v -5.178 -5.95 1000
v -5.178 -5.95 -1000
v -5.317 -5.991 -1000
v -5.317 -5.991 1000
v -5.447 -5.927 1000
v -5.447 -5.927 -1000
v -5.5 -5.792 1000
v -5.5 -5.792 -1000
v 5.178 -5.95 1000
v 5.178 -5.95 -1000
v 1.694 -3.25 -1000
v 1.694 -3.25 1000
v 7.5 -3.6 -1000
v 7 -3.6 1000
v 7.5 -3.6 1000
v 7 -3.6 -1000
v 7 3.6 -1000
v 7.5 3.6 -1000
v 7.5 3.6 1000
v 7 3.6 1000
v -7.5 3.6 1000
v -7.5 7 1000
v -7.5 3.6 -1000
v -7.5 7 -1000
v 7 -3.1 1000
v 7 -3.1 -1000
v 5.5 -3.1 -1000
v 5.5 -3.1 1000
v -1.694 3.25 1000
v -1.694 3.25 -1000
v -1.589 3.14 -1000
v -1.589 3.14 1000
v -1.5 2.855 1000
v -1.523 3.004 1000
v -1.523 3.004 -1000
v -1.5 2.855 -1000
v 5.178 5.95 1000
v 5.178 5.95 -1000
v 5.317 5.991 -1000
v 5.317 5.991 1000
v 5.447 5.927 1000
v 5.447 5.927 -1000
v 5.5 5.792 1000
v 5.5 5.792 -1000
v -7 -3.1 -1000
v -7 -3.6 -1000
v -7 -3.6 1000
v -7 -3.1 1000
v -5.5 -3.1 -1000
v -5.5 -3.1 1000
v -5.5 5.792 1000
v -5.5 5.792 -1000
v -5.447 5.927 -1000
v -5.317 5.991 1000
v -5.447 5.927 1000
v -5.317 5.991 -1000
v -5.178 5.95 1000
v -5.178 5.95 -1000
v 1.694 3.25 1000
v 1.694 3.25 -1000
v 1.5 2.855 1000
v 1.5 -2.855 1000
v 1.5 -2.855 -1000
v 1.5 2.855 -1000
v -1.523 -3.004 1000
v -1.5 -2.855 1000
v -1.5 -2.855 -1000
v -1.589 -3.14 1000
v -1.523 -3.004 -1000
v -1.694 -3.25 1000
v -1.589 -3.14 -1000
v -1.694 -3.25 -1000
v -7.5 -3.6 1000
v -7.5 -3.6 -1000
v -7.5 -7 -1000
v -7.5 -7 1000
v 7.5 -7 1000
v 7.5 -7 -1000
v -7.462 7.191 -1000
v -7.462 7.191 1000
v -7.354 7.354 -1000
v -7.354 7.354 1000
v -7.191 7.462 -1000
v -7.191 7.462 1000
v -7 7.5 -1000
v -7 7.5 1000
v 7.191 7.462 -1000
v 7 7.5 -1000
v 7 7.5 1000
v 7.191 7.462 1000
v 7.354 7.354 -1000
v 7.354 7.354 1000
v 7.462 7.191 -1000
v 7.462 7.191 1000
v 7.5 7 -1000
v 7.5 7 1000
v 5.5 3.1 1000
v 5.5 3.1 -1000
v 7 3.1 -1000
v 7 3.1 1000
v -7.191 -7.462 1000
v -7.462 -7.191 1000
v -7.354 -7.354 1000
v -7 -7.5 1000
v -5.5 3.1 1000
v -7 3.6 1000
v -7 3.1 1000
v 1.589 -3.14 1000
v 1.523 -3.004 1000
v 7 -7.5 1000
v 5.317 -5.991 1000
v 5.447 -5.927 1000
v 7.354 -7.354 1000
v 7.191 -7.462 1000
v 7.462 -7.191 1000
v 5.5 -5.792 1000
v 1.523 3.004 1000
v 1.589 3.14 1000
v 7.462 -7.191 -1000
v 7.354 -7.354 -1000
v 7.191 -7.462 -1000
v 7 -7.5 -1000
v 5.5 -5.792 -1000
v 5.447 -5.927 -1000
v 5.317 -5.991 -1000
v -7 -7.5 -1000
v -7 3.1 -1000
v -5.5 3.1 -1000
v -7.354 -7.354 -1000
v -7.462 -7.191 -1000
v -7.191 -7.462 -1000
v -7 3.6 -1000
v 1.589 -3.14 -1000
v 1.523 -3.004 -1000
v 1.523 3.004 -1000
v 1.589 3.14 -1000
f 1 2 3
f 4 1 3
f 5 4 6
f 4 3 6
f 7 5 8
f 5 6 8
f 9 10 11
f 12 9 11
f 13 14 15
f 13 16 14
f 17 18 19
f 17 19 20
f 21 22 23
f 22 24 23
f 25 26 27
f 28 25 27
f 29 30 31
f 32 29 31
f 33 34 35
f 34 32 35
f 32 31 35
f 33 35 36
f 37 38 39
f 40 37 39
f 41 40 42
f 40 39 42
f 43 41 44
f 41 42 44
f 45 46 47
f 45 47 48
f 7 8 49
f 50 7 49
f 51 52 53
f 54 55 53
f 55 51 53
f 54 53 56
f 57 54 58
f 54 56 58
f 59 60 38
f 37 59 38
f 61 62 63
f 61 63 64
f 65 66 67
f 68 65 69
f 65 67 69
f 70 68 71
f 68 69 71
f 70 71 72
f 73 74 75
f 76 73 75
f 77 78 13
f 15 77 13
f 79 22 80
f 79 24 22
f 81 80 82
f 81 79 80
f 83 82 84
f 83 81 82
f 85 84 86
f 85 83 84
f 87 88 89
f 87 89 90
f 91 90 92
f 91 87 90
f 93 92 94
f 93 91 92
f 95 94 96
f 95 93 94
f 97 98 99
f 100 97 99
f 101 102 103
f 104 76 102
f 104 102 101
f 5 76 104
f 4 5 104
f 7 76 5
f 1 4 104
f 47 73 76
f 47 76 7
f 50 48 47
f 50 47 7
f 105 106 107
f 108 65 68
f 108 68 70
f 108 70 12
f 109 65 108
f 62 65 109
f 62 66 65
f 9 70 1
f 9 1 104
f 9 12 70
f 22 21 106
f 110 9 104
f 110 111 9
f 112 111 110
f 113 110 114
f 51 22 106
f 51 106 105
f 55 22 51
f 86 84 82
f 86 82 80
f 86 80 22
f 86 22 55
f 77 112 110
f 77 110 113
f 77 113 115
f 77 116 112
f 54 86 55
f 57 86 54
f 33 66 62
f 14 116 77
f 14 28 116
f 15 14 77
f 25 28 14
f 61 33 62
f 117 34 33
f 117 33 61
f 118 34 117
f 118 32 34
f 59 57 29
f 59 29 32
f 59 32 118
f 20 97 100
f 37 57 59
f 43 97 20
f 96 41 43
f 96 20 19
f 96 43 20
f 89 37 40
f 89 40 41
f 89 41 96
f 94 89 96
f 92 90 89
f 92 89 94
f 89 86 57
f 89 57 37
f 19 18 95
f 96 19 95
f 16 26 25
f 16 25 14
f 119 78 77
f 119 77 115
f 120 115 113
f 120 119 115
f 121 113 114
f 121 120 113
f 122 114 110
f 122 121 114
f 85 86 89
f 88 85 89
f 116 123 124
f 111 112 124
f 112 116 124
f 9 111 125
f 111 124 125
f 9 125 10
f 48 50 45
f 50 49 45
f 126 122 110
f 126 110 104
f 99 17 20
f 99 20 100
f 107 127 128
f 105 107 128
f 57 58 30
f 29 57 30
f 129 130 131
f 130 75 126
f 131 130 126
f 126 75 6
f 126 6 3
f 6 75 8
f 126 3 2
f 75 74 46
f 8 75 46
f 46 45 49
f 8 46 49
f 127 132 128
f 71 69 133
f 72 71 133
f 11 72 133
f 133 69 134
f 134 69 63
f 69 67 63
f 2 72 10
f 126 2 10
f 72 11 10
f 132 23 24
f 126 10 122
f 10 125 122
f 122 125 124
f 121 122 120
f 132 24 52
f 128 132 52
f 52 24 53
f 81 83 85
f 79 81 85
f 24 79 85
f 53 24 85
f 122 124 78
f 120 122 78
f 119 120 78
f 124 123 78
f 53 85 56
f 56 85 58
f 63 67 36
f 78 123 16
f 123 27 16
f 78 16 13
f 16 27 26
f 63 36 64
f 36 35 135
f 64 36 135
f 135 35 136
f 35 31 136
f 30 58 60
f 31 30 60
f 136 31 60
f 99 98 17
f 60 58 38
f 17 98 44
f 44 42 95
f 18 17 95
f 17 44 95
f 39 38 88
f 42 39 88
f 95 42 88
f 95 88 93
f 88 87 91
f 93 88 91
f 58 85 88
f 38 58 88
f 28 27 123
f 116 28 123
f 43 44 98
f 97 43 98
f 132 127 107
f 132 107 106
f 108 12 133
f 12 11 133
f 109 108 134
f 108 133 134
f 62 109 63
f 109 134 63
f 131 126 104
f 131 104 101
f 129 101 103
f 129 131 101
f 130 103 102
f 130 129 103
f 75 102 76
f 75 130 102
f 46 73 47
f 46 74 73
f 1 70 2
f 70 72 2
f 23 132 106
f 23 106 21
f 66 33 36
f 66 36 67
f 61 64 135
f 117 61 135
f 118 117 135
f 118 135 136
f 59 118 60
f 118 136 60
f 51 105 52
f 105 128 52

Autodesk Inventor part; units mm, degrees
ref_plane "YZ Plane" through (0, 0, 0) normal (1, 0, 0) x (0, 1, 0)
ref_plane "XZ Plane" through (0, 0, 0) normal (0, 1, 0) x (-1, 0, 0)
ref_plane "XY Plane" through (0, 0, 0) normal (0, 0, 1) x (1, 0, 0)
sketch "Esboço1" plane through (0, 0, 0) normal (0, 0, 1) x (1, 0, 0)
  line L0 (7.5, 7.5) -> (-7.5, 7.5) construction
  line L1 (-7.5, 3.1) -> (-7.5, -3.1) construction
  line L2 (-7.5, 7.5) -> (-7.5, 3.1) construction
  line L3 (-7.5, 3.1) -> (-5.5, 3.1) construction
  line L4 (-5.5, 3.1) -> (-5.5, 6.2) construction
  line L5 (-5.5, 6.2) -> (-1.5, 3.1) construction
  line L6 (-1.5, 3.1) -> (-1.5, 0) construction
  line L7 (-1.5, 0) -> (0, 0)
  line L8 (0, 0) -> (0, 7.5)
  arc A0 (-7, 7.5) -> (-7.5, 7) centre (-7, 7) ccw
  line L9 (-7.5, 3.1) -> (-7, 3.1) construction
  line L10 (-7, 3.1) -> (-7, 3.6)
  line L11 (-7, 3.6) -> (-7.5, 3.6)
  line L12 (-7.5, 3.6) -> (-7.5, 3.1) construction
  line L13 (-7.5, 7) -> (-7.5, 3.6)
  line L14 (-7, 7.5) -> (0, 7.5)
  line L15 (-7, 3.1) -> (-5.5, 3.1)
  arc A1 (-5.1775, 5.9501) -> (-5.5, 5.792) centre (-5.3, 5.792) ccw
  line L16 (-5.5, 3.1) -> (-5.5, 5.792)
  arc A2 (-1.5, 2.8549) -> (-1.6937, 3.2501) centre (-2, 2.8549) ccw
  line L17 (-5.1775, 5.9501) -> (-1.6937, 3.2501)
  line L18 (-1.5, 2.8549) -> (-1.5, 0)
  point P0 (-7.5, 0)
  dimension "d0" = 15
  dimension "d1" = 6.2
  dimension "d2" = 7.5
  dimension "d4" = 2
  dimension "d5" = 6
  dimension "d7" = 3.1
  dimension "d10" = 0.5
  dimension "d11" = 0.5
  dimension "d12" = 0.2
  dimension "d13" = 0.5
extrude "Extrusão1" add sketch "Esboço1" along normal mid plane 2000
mirror "Espelhar1" about plane through (0, 0, 0) normal (1, 0, 0) of "Extrusão1"
mirror "Espelhar2" about plane through (0, 0, 0) normal (0, 1, 0) of "Extrusão1", "Espelhar1"
equation "\"d2\" = 0.5 * d0"
properties part number "15×15 2 slots profile_AST01501502" material "Alumínio 6061"
